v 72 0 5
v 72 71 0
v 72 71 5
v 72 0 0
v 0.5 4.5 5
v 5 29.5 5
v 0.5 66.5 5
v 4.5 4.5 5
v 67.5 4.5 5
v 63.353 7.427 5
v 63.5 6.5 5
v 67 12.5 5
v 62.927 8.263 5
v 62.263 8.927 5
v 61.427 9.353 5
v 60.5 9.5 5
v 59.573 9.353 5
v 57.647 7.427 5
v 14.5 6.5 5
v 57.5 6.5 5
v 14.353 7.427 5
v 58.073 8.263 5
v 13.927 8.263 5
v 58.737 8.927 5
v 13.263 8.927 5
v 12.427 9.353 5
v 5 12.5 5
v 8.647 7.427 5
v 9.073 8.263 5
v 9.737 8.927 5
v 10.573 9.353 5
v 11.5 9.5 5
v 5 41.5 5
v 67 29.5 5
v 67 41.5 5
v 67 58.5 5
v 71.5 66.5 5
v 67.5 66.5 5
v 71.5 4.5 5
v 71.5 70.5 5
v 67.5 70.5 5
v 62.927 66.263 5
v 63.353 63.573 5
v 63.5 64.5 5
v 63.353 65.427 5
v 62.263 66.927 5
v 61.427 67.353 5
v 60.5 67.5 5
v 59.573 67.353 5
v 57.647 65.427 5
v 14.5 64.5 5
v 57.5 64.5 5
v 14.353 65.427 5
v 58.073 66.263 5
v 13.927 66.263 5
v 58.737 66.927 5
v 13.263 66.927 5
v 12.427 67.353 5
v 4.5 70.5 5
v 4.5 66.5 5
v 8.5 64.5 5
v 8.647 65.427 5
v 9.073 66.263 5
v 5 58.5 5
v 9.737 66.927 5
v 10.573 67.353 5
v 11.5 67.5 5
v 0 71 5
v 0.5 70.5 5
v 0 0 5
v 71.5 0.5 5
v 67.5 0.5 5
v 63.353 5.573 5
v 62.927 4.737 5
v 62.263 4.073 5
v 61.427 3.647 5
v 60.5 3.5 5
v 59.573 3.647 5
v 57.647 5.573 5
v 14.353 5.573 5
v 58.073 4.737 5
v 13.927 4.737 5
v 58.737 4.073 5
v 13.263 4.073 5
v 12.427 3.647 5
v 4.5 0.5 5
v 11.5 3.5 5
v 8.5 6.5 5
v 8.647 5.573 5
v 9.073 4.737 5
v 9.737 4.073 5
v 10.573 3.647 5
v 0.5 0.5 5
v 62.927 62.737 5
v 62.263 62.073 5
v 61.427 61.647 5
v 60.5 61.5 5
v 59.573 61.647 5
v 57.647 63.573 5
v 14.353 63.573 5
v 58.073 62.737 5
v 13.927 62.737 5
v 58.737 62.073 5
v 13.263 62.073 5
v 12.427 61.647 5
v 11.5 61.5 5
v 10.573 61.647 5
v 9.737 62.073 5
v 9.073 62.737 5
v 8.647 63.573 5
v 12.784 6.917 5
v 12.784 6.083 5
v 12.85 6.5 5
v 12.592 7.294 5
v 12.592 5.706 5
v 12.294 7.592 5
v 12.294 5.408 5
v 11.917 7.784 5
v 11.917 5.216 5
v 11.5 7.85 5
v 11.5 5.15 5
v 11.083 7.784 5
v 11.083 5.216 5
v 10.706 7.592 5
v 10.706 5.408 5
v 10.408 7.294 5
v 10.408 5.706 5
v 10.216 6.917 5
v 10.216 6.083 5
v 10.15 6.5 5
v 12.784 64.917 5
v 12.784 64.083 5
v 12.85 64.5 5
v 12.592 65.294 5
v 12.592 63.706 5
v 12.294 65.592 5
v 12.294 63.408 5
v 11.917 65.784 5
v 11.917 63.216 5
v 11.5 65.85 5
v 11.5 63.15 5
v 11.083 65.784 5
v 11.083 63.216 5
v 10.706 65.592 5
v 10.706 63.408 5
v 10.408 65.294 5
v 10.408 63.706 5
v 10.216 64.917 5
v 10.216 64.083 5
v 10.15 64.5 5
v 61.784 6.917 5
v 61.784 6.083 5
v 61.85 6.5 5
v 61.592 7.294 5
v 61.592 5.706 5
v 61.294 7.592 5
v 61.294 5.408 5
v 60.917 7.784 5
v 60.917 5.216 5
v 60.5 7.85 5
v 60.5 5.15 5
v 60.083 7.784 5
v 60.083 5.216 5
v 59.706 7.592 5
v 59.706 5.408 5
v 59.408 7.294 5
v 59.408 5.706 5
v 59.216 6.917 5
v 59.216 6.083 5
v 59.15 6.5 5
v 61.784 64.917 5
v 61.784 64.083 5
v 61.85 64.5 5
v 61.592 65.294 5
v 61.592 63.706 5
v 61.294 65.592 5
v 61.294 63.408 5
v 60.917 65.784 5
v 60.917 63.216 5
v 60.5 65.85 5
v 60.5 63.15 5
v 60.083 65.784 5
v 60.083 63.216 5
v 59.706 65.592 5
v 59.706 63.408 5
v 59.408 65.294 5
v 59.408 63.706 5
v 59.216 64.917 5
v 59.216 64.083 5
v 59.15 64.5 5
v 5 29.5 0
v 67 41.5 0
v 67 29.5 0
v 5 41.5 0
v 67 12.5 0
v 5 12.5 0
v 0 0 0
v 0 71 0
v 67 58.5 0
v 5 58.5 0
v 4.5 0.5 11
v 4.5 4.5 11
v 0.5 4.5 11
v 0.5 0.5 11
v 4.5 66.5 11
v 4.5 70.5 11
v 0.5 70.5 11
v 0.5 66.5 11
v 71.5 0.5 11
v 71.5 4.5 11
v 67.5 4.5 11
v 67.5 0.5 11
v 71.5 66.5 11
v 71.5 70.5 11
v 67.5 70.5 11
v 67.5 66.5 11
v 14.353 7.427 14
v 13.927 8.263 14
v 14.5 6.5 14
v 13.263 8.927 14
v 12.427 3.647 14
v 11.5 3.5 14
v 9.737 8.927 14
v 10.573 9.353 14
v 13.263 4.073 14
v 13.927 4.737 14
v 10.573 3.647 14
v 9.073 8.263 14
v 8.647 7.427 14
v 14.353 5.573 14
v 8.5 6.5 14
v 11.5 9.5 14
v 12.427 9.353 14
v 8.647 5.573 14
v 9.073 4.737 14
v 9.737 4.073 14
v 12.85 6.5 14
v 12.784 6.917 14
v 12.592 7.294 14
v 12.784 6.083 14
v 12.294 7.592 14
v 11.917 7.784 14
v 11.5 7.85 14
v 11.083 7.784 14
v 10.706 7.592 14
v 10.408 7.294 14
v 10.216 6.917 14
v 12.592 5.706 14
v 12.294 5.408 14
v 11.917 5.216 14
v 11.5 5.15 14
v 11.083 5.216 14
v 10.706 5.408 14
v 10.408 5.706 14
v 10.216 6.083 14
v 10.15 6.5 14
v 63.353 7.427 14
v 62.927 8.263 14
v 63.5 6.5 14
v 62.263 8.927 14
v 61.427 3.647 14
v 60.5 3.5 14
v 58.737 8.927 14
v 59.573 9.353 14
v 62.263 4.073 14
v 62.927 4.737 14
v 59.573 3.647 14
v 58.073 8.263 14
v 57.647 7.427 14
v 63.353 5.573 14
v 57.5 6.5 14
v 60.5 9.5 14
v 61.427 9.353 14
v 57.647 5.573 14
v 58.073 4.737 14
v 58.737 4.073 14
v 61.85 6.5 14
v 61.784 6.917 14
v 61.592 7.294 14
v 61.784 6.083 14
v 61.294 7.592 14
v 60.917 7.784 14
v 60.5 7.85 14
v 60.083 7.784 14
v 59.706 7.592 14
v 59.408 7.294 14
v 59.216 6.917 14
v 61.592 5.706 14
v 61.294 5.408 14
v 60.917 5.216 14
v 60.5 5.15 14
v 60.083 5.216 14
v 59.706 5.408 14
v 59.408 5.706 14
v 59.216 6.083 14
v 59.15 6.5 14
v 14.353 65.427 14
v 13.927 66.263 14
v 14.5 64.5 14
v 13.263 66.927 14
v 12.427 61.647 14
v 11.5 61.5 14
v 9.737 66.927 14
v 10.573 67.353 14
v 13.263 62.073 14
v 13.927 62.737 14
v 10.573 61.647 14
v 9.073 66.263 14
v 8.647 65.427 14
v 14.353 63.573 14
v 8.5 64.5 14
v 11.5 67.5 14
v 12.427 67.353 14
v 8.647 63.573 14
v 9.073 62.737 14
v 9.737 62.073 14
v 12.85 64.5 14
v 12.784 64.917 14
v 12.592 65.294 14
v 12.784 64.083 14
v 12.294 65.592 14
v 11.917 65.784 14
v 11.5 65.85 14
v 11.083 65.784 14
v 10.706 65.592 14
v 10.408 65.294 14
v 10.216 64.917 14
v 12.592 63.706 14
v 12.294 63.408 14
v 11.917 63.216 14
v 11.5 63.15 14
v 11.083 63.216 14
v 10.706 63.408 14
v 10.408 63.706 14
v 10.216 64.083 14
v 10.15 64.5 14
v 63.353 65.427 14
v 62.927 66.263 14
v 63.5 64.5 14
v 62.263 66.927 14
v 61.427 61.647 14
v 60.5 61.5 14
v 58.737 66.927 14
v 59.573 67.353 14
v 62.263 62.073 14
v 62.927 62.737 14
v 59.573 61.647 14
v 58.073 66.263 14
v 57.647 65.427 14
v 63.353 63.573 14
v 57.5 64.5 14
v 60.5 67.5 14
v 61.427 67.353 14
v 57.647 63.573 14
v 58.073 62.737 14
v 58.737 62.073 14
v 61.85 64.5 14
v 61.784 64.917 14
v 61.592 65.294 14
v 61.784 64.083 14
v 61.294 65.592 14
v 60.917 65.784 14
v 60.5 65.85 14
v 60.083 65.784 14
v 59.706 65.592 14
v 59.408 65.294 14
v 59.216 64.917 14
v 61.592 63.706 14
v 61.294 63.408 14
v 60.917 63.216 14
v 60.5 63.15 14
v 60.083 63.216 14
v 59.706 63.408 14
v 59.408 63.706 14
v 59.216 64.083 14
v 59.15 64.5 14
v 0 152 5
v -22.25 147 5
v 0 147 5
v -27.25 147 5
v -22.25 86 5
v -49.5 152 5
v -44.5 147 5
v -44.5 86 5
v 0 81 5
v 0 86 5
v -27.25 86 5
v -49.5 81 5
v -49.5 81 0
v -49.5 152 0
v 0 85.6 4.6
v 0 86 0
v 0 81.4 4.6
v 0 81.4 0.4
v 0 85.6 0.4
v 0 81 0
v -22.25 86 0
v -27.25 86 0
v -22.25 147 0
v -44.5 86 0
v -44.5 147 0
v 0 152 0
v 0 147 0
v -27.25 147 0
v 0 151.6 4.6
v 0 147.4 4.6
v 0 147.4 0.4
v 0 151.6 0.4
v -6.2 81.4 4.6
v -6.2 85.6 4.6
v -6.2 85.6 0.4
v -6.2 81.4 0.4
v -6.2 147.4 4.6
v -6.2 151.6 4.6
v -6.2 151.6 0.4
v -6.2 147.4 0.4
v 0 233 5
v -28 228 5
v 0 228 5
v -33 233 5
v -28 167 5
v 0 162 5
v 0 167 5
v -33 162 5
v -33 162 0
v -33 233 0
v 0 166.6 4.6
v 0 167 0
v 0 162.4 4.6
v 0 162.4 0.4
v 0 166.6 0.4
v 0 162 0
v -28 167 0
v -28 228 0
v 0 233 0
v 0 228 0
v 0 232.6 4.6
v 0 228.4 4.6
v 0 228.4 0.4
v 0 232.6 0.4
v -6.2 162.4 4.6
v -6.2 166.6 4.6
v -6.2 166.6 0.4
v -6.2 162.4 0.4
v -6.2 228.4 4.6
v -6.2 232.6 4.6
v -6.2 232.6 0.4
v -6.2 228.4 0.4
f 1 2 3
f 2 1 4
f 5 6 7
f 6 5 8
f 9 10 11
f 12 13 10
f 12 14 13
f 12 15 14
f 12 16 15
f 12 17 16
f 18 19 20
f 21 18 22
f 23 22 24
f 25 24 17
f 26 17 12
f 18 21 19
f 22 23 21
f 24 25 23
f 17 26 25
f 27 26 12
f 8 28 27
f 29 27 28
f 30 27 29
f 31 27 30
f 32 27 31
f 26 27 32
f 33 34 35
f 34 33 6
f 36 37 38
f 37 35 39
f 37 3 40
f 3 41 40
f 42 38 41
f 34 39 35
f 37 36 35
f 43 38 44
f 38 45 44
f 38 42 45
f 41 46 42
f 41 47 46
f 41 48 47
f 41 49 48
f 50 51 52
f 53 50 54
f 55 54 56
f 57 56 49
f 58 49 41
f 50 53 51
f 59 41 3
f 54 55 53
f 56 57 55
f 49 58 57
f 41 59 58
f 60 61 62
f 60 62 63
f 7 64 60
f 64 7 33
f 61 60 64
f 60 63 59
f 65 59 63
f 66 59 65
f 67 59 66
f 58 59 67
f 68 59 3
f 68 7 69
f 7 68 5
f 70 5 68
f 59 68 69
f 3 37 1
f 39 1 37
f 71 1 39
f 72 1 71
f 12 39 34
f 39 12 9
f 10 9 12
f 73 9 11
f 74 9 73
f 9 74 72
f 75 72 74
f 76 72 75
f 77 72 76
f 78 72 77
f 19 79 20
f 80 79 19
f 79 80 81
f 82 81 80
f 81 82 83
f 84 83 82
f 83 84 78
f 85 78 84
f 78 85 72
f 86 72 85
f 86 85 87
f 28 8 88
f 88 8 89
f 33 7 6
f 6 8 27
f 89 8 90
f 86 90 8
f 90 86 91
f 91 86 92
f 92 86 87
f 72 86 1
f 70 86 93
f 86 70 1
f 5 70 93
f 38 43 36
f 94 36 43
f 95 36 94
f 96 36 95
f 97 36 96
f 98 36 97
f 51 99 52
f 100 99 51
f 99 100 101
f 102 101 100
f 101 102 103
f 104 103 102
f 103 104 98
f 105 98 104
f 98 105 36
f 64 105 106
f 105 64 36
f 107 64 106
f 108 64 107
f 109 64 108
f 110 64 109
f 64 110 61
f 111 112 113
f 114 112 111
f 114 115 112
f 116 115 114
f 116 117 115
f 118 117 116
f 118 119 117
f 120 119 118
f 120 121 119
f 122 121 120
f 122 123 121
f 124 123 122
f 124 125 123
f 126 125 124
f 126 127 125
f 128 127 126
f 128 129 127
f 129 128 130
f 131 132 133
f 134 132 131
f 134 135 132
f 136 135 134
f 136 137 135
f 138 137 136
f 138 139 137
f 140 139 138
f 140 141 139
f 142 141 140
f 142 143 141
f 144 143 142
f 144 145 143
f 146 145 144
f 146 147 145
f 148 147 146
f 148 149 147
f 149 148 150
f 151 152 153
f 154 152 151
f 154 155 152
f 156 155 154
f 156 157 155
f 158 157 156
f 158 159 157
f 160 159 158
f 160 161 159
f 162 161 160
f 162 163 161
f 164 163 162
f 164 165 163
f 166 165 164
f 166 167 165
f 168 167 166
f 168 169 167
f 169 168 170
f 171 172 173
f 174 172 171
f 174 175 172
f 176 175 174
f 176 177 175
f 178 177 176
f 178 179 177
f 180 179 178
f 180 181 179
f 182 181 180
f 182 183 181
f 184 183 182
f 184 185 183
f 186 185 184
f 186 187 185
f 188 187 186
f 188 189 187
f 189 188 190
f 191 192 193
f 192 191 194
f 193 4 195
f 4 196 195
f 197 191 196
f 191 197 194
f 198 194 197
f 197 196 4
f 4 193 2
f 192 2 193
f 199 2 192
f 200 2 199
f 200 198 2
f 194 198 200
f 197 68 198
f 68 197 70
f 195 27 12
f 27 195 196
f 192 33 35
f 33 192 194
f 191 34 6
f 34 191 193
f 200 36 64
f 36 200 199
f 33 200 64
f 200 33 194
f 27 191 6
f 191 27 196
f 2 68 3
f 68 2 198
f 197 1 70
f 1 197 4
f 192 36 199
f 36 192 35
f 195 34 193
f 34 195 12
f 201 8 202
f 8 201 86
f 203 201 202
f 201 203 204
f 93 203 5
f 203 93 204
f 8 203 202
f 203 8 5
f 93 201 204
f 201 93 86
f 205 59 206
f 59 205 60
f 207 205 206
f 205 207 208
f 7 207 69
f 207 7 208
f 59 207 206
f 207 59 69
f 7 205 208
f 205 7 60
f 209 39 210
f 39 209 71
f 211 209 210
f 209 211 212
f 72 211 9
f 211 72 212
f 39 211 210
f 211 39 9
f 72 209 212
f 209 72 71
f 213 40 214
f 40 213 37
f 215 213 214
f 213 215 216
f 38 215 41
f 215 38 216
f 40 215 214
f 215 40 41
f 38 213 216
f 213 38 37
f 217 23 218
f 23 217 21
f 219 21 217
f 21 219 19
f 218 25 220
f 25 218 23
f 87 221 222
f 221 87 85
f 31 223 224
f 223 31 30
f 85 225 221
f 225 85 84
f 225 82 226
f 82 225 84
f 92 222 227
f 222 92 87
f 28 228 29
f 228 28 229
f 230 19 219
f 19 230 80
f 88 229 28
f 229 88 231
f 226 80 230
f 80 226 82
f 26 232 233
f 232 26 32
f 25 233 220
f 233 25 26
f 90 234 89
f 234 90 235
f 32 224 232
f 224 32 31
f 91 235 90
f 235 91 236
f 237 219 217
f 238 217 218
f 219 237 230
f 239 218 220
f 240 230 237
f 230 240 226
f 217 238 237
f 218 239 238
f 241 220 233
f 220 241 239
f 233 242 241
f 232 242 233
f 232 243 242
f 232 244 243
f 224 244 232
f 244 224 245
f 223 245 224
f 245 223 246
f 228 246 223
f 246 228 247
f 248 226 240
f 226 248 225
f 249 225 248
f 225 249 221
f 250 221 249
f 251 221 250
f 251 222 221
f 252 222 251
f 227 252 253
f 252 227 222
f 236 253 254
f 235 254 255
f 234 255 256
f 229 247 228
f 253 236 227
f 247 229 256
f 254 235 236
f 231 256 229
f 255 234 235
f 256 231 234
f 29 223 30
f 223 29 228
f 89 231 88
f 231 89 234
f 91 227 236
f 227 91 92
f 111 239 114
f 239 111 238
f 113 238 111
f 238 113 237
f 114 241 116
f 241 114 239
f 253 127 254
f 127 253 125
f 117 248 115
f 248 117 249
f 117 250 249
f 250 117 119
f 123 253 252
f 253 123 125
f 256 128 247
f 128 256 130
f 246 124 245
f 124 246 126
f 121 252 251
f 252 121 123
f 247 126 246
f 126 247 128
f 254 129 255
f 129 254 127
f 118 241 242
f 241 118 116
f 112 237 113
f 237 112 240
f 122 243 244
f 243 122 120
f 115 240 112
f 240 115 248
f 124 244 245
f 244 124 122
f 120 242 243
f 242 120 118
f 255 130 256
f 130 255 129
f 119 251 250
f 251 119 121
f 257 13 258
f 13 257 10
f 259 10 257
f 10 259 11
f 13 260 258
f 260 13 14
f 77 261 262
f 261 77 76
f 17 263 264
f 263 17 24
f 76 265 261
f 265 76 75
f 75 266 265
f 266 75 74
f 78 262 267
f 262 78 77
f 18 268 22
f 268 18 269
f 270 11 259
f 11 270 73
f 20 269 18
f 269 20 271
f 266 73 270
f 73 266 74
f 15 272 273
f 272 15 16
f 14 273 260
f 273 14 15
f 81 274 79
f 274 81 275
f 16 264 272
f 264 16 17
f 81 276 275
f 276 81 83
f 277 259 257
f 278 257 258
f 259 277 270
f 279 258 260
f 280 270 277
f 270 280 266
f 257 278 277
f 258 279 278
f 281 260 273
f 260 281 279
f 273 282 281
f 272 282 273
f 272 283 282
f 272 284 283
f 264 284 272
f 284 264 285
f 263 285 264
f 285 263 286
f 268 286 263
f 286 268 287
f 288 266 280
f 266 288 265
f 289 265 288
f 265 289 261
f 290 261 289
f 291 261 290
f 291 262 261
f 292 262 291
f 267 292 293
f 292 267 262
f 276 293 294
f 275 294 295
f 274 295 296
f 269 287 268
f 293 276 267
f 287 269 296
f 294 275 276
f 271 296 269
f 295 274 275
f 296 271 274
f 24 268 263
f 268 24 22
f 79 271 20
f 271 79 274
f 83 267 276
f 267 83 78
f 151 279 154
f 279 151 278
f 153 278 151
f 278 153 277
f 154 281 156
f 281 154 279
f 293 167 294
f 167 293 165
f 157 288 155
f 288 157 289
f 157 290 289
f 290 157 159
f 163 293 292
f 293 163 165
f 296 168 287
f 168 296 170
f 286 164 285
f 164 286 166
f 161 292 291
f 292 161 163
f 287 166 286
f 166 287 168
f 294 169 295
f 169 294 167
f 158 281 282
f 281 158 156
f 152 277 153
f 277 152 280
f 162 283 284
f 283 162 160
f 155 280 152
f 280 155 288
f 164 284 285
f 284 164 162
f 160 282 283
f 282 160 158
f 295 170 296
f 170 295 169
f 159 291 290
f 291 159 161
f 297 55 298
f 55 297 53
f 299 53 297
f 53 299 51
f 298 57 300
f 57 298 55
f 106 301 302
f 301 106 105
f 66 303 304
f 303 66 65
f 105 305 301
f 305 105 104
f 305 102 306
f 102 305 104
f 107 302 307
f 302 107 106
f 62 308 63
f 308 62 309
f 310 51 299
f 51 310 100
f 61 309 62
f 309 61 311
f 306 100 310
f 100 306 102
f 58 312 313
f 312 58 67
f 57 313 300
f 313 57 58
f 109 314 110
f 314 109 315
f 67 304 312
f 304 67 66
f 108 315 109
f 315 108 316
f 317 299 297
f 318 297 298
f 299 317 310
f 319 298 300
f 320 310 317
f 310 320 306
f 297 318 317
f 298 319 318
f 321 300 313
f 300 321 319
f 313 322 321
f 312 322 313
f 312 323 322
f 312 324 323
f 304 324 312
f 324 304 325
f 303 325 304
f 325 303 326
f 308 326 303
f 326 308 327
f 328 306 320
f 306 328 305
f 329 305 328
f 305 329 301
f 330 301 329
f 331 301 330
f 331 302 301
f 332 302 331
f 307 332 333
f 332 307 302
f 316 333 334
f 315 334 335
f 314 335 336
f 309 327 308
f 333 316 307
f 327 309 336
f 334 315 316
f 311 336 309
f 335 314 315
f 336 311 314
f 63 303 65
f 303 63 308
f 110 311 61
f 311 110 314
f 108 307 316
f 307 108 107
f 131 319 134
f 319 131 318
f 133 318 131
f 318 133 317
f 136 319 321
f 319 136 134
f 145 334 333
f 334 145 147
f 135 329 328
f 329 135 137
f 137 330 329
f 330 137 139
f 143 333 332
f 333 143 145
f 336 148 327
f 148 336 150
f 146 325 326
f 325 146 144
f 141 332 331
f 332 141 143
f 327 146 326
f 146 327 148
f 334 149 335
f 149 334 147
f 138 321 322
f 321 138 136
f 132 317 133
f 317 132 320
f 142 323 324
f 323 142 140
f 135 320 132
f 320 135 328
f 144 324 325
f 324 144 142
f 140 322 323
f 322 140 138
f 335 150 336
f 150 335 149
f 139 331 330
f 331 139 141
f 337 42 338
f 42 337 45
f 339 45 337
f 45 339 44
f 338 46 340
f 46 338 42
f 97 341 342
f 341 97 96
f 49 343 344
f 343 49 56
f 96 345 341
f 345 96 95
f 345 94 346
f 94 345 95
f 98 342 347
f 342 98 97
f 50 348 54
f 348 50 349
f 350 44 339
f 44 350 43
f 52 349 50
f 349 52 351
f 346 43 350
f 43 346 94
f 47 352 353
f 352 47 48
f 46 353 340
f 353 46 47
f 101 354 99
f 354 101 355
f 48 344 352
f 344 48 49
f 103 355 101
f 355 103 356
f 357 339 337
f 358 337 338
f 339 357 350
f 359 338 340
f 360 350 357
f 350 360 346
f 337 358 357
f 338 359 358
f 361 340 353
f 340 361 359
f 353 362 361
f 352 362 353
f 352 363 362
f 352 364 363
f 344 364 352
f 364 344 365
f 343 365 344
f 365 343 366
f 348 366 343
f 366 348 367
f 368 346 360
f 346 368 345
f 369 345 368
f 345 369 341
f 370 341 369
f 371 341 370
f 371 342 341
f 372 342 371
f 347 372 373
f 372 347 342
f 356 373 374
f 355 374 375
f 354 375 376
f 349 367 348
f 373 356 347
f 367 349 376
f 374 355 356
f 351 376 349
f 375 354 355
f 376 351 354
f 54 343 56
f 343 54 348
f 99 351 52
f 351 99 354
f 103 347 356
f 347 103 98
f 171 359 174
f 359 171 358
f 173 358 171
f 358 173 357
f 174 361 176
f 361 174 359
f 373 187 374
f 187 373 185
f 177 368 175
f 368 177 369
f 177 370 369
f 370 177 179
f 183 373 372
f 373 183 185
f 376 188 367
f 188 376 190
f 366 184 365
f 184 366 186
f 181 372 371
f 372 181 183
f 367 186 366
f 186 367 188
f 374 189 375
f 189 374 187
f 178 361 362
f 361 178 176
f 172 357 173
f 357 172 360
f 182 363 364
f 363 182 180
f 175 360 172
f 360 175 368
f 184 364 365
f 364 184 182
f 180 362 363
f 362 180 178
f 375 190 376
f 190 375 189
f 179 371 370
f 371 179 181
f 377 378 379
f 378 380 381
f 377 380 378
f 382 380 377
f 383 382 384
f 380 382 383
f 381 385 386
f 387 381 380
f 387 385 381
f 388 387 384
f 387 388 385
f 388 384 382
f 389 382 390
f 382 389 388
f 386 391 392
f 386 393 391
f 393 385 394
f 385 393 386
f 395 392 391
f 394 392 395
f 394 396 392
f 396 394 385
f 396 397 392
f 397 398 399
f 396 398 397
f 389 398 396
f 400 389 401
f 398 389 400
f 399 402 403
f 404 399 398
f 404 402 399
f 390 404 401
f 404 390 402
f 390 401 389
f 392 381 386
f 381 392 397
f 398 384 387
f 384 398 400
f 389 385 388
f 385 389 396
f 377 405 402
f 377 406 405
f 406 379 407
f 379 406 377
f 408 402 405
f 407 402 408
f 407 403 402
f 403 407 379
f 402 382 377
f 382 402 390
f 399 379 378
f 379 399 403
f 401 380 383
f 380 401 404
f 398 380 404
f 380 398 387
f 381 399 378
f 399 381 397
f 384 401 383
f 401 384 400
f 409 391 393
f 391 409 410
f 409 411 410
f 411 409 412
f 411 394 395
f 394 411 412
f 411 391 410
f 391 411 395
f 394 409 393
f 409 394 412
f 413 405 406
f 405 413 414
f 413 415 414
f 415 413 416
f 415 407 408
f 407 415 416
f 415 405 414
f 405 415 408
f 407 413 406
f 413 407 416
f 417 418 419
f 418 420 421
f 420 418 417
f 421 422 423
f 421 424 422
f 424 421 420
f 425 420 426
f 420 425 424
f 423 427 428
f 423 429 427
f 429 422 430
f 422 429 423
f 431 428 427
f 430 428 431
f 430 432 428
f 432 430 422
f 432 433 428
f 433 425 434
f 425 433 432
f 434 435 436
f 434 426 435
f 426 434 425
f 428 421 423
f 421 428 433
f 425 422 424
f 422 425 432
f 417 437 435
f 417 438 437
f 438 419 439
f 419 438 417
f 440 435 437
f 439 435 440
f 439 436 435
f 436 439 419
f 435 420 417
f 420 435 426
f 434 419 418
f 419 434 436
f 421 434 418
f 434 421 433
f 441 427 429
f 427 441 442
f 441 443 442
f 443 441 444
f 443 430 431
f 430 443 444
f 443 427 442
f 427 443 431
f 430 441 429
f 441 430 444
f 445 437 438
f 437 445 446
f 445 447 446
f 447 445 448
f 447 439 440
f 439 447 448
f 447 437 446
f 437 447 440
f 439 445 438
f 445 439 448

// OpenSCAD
// Neato XV Signature Pro - Outer Left Pod PRINT FILE
// All parts in one file — base + outer wall + inner wall — for a single print job.
// Base prints flat (ribbed face down). Sides lay flat on outer face.
// No supports needed.
//
// ASSEMBLY: press side wall posts into base bosses after printing.

// ============================================================
// PARAMETERS
// ============================================================

pod_width  = 72;
pod_depth  = 71;
pod_height = 66;

rail_w = 5;
rib_w  = 12;

outer_wall_h = pod_height * 0.75;  // ~50mm — protection on exposed edge
inner_wall_h = pod_height * 0.50;  // ~33mm — wire routing access

standoff_h    = 9;
standoff_od   = 6;
standoff_hole = 2.7; // M2.5

boss_size  = 4;
boss_h     = 6;

socket_size  = 4.2;
socket_depth = 6.2;

yahboom_hole_x_span = 49;
yahboom_hole_y_span = 58;

yahboom_x_left  = (pod_width - yahboom_hole_x_span) / 2;
yahboom_x_right = yahboom_x_left + yahboom_hole_x_span;

yahboom_y_front = (pod_depth - yahboom_hole_y_span) / 2;
yahboom_y_rear  = yahboom_y_front + yahboom_hole_y_span;
yahboom_y_mid   = (yahboom_y_front + yahboom_y_rear) / 2;

rib_positions = [yahboom_y_front, yahboom_y_mid, yahboom_y_rear];

yahboom_holes = [
    [yahboom_x_left,  yahboom_y_front],
    [yahboom_x_right, yahboom_y_front],
    [yahboom_x_left,  yahboom_y_rear ],
    [yahboom_x_right, yahboom_y_rear ],
];

boss_locations = [
    [rail_w/2,             rail_w/2              ],
    [rail_w/2,             pod_depth - rail_w/2  ],
    [pod_width - rail_w/2, rail_w/2              ],
    [pod_width - rail_w/2, pod_depth - rail_w/2  ],
];

// ============================================================
// MODULES
// ============================================================

module socket() {
    translate([-socket_size/2, -socket_size/2, 0])
        cube([socket_size, socket_size, socket_depth]);
}

module ribbed_bottom() {
    cube([rail_w, pod_depth, rail_w]);
    translate([pod_width - rail_w, 0, 0])
        cube([rail_w, pod_depth, rail_w]);
    cube([pod_width, rail_w, rail_w]);
    translate([0, pod_depth - rail_w, 0])
        cube([pod_width, rail_w, rail_w]);
    for (y_center = rib_positions) {
        translate([0, y_center - rib_w / 2, 0])
            cube([pod_width, rib_w, rail_w]);
    }
}

module standoff(h, hole_d) {
    difference() {
        cylinder(h=h, d=standoff_od, $fn=20);
        cylinder(h=h + 0.1, d=hole_d, $fn=20);
    }
}

module outer_side() {
    difference() {
        union() {
            cube([rail_w, rail_w, outer_wall_h]);
            translate([0, pod_depth - rail_w, 0])
                cube([rail_w, rail_w, outer_wall_h]);
            translate([0, 0, outer_wall_h / 2 - rail_w / 2])
                cube([rail_w, pod_depth, rail_w]);
            translate([0, 0, outer_wall_h - rail_w])
                cube([rail_w, pod_depth, rail_w]);
        }
        translate([rail_w/2, rail_w/2, 0])             socket();
        translate([rail_w/2, pod_depth - rail_w/2, 0]) socket();
    }
}

module inner_side() {
    difference() {
        union() {
            cube([rail_w, rail_w, inner_wall_h]);
            translate([0, pod_depth - rail_w, 0])
                cube([rail_w, rail_w, inner_wall_h]);
            translate([0, 0, inner_wall_h - rail_w])
                cube([rail_w, pod_depth, rail_w]);
        }
        translate([rail_w/2, rail_w/2, 0])             socket();
        translate([rail_w/2, pod_depth - rail_w/2, 0]) socket();
    }
}

// ============================================================
// MAIN — base + two sides laid out flat on bed
// ============================================================

// Base — flat, ribbed face down
union() {
    ribbed_bottom();
    for (b = boss_locations) {
        translate([b[0] - boss_size/2, b[1] - boss_size/2, rail_w])
            cube([boss_size, boss_size, boss_h]);
    }
    for (h = yahboom_holes) {
        translate([h[0], h[1], rail_w])
            standoff(standoff_h, standoff_hole);
    }
}

// Outer side — flat, offset in Y
translate([0, pod_depth + 10, 0])
rotate([0, -90, 0])
outer_side();

// Inner side — flat, offset further in Y
translate([0, pod_depth * 2 + 20, 0])
rotate([0, -90, 0])
inner_side();
